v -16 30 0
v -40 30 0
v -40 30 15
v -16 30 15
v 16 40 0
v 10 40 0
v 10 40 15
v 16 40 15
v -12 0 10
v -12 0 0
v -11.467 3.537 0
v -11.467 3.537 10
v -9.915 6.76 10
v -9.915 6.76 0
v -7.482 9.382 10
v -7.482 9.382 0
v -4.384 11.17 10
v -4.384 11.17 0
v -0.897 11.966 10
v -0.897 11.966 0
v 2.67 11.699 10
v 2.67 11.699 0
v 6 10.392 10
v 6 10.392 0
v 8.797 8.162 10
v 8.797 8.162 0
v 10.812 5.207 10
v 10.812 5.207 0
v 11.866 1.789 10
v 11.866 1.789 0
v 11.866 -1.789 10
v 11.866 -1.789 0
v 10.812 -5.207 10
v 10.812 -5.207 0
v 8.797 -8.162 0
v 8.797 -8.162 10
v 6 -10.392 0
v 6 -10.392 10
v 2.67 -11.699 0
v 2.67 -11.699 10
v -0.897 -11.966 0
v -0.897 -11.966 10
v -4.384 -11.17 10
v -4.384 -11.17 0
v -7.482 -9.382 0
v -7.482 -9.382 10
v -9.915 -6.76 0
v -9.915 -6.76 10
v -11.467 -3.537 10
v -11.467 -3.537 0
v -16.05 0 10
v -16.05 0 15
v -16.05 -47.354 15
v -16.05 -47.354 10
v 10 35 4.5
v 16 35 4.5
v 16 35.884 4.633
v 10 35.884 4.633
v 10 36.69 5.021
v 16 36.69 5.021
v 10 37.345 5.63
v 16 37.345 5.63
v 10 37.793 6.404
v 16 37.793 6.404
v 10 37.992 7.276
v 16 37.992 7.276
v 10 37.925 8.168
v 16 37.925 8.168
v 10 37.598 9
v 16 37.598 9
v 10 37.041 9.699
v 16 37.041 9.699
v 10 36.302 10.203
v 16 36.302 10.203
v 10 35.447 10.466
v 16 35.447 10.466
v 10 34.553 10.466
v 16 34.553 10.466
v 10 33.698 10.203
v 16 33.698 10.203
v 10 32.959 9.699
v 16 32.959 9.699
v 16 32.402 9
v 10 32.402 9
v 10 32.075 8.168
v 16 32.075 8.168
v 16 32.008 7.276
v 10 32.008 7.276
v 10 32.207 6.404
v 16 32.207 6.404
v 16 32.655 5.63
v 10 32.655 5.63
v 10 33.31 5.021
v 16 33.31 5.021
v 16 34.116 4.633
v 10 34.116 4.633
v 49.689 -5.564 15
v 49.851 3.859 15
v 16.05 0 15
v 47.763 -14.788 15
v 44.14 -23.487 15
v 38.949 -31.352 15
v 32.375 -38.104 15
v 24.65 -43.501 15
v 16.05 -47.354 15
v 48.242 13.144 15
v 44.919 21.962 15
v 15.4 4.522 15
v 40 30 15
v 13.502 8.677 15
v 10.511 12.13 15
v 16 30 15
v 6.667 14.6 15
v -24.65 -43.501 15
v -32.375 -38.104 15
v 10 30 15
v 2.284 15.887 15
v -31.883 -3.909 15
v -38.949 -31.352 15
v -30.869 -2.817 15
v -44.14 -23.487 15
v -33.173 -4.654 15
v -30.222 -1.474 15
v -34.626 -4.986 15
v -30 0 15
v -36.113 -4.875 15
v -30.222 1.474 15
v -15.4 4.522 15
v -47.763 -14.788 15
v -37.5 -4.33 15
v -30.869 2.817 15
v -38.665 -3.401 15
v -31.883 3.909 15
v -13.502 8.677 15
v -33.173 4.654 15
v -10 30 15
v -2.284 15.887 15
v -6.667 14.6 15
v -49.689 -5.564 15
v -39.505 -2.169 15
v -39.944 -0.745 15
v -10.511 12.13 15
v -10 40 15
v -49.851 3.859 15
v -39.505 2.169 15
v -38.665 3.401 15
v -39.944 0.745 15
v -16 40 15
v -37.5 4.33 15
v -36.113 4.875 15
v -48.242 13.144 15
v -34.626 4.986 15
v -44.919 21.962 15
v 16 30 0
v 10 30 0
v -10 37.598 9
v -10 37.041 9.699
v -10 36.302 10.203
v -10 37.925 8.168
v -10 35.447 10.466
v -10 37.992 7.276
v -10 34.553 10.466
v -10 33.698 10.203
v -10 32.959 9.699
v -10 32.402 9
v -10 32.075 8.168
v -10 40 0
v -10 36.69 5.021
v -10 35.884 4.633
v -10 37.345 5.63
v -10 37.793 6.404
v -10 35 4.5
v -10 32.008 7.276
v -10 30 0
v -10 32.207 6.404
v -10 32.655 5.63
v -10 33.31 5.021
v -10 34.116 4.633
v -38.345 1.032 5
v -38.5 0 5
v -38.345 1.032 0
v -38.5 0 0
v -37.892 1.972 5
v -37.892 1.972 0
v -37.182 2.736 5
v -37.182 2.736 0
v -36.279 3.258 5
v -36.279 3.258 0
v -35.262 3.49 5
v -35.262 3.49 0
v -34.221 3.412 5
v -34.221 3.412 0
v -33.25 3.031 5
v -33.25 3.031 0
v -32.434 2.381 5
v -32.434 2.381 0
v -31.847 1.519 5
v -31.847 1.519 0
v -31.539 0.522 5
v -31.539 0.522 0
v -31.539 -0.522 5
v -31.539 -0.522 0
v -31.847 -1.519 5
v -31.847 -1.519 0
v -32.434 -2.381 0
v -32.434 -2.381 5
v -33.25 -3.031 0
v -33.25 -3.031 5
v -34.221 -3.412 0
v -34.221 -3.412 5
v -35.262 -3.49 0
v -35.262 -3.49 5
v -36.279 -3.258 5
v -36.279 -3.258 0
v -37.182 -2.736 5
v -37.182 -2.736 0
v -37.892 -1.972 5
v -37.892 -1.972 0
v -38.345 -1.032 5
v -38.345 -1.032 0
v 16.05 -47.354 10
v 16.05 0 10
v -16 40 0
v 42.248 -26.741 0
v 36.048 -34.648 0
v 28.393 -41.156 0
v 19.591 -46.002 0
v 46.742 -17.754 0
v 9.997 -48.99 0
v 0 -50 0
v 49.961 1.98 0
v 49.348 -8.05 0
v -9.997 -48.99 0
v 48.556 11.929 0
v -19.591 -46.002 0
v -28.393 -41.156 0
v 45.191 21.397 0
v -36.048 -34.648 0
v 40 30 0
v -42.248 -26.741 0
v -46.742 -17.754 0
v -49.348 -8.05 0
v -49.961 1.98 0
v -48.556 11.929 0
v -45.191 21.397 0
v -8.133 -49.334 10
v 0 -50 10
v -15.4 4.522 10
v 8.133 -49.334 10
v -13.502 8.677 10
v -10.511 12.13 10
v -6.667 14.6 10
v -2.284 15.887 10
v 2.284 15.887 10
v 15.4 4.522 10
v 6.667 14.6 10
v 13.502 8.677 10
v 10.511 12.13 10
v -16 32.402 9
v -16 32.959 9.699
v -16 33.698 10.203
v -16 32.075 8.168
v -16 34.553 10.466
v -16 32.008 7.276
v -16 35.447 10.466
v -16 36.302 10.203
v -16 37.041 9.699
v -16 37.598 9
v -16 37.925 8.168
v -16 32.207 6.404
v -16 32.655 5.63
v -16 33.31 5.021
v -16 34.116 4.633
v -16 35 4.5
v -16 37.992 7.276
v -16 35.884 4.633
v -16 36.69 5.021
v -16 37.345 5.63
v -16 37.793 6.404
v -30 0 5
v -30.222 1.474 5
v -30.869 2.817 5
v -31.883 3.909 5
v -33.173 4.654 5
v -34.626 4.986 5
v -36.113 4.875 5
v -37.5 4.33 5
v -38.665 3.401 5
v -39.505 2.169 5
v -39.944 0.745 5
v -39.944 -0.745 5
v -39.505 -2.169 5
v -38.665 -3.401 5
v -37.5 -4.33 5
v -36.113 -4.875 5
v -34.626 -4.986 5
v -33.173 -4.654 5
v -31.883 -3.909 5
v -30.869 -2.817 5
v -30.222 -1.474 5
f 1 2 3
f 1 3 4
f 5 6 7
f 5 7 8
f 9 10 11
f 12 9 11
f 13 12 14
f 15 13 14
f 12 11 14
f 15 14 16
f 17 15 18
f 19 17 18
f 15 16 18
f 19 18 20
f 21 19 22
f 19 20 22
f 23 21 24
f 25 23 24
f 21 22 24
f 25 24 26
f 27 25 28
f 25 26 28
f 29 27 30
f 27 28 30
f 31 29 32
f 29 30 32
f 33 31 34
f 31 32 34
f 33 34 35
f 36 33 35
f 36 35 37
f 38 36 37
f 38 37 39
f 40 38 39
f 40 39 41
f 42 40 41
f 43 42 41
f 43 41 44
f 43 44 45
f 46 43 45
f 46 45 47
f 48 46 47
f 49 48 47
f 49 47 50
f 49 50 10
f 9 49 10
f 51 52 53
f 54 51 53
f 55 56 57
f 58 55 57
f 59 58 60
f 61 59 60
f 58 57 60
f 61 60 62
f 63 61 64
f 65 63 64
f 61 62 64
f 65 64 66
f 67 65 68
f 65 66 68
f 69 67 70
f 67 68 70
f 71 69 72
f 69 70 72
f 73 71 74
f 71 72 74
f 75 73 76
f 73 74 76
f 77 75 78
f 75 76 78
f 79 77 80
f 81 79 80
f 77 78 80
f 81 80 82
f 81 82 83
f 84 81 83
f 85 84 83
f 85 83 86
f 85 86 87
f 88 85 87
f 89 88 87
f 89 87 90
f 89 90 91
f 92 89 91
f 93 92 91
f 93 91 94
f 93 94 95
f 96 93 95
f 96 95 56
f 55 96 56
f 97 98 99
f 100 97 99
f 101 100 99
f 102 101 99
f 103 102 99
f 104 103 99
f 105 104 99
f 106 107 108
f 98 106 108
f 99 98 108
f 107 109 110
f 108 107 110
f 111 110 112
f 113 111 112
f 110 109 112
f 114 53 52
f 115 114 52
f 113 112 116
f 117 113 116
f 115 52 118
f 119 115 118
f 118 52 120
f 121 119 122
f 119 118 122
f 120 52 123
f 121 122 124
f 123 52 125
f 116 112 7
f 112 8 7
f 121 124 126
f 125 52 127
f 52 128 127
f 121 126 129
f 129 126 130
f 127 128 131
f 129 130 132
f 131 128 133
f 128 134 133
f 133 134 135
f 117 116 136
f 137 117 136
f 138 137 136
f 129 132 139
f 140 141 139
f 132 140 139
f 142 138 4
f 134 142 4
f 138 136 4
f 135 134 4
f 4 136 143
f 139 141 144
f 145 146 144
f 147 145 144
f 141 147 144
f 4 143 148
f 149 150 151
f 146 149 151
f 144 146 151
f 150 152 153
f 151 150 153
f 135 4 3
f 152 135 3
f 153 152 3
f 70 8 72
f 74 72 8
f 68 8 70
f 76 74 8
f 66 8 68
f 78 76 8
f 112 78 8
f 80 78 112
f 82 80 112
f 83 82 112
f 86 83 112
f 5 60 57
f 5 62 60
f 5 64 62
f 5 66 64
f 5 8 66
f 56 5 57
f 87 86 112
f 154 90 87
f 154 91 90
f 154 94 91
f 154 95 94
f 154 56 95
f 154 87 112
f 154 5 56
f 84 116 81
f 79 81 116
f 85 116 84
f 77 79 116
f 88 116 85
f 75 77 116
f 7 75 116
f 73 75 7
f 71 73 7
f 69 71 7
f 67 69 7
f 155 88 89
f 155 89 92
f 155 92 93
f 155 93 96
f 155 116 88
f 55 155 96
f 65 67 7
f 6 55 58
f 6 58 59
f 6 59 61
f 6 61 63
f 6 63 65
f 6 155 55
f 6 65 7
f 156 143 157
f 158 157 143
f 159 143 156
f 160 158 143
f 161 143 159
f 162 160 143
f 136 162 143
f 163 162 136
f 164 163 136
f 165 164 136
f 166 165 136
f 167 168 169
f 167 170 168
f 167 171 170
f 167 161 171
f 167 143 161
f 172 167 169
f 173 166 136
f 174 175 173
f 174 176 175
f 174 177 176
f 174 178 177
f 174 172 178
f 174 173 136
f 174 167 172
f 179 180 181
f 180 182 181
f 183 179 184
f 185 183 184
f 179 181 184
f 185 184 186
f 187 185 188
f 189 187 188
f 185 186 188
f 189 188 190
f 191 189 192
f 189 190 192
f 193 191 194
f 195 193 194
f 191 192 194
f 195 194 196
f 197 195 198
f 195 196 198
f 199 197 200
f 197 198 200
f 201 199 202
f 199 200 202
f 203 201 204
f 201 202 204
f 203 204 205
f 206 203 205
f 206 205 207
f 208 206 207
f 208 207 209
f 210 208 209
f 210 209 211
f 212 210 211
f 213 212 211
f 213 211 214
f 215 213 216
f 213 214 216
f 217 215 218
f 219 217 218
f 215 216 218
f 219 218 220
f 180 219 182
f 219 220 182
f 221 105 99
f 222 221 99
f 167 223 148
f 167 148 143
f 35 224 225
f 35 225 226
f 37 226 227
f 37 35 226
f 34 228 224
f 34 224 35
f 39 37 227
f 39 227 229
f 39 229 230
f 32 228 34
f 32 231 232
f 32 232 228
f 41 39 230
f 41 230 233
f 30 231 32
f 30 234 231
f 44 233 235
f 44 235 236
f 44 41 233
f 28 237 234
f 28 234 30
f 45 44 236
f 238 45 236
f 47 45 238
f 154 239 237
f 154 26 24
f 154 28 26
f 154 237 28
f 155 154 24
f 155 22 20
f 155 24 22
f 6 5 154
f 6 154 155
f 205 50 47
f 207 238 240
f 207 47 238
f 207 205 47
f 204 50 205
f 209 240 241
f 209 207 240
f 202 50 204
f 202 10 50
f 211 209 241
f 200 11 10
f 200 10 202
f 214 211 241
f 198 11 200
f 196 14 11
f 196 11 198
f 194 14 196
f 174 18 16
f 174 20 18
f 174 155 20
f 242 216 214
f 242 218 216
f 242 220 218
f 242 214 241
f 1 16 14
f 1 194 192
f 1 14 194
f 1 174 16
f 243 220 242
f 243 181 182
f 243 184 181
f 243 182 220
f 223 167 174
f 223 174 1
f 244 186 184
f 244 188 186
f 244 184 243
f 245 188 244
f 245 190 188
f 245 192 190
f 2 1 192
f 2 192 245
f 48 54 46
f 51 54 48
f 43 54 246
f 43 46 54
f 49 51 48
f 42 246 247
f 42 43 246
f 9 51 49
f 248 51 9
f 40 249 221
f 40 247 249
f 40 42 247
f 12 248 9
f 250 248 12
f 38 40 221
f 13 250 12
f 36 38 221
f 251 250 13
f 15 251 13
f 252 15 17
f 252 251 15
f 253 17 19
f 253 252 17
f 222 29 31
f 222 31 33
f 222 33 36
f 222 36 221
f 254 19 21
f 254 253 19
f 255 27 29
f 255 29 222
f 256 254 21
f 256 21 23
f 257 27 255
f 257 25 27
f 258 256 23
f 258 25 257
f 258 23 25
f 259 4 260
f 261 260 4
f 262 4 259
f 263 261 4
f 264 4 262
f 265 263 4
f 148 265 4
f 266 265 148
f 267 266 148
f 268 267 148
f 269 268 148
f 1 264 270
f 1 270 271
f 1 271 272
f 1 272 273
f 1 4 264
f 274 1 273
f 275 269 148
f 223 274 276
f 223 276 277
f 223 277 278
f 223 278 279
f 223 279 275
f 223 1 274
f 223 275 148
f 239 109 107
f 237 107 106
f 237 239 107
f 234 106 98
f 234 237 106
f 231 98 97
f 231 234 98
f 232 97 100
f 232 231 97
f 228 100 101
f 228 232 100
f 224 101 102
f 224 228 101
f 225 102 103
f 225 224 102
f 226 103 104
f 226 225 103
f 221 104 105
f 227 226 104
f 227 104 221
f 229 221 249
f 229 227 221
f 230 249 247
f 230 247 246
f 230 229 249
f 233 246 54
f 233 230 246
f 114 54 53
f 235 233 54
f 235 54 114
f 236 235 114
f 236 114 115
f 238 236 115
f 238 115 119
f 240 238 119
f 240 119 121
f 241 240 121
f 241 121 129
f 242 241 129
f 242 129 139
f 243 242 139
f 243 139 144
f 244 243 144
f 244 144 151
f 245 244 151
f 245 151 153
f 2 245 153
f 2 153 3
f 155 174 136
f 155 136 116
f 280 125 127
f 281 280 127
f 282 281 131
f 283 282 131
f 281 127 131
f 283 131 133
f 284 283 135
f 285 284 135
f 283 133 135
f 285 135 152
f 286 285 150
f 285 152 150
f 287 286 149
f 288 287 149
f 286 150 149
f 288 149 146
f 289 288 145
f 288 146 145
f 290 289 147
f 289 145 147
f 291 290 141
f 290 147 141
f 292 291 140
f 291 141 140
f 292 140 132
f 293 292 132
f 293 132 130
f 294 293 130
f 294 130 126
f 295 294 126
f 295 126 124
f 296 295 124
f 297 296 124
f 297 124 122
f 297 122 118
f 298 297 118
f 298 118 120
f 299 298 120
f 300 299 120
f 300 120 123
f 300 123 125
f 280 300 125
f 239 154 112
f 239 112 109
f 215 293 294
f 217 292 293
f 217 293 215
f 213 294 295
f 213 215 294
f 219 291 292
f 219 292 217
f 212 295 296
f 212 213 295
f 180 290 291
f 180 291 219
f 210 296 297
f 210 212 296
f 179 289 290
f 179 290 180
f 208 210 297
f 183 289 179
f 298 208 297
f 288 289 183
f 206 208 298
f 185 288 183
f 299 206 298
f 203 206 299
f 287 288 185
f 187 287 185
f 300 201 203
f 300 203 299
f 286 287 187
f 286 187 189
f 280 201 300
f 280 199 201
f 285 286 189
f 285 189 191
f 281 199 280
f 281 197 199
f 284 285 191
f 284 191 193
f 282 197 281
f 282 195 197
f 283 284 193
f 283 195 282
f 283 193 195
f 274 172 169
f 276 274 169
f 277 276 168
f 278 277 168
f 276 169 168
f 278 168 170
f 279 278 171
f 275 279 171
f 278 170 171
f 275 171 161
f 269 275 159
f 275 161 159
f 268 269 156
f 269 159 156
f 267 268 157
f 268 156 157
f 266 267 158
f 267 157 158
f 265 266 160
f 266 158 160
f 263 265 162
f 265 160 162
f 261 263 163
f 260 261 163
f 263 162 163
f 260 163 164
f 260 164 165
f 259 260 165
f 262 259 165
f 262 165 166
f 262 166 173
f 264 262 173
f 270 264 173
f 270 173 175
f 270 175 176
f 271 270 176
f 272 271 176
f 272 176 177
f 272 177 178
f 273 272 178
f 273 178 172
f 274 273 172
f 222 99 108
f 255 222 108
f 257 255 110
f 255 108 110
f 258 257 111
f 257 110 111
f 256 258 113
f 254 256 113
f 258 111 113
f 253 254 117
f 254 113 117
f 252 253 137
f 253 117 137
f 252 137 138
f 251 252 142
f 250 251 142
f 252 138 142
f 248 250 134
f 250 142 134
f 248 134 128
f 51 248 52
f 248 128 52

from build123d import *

# Parameters (mm, degrees)
ESTRUSIONE_ESTRUSIONE1_DEPTH                         = 15
TAGLIO_ESTRUSIONE1_DEPTH                             = 5
FORO_6_0_6_1_D                                       = 6
FORO_LAMATO_PER_BULLONE_M5_A_TESTA_ESAGO_D           = 7
FORO_LAMATO_PER_BULLONE_M5_A_TESTA_ESAGO_CBORE_D     = 10
FORO_LAMATO_PER_BULLONE_M5_A_TESTA_ESAGO_CBORE_DEPTH = 10
FORO_24_0_24_1_D                                     = 24


with BuildPart() as part:
    # Schizzo1 → Estrusione-Estrusione1 (new body)
    with BuildSketch(Plane.XY):
        with BuildLine():
            Line((-40, 30), (-16, 30))
            Line((-16, 30), (-16, 40))
            Line((-16, 40), (-10, 40))
            Line((-10, 40), (-10, 30))
            Line((-10, 30), (10, 30))
            Line((10, 30), (10, 40))
            Line((10, 40), (16, 40))
            Line((16, 40), (16, 30))
            Line((16, 30), (40, 30))
            ThreePointArc((40, 30), (0, -50), (-40, 30))
        make_face()
    extrude(amount=ESTRUSIONE_ESTRUSIONE1_DEPTH)

    # Schizzo2 → Taglio-Estrusione1 (cut)
    with BuildSketch(Plane.XY.offset(15)):
        with BuildLine():
            Line((-16.05, 0), (-16.05, -50))
            Line((-16.05, -50), (16.05, -50))
            Line((16.05, -50), (16.05, 0))
            ThreePointArc((16.05, 0), (0, 16.05), (-16.05, 0))
        make_face()
    extrude(amount=-TAGLIO_ESTRUSIONE1_DEPTH, mode=Mode.SUBTRACT)

    # Foro Ø6.0 (6)-1 (through all)
    with Locations(Plane.ZY.offset(16)):
        with Locations((7.5, 35)):
            Hole(FORO_6_0_6_1_D / 2)

    # Foro lamato per Bullone M5 a testa esagonale-1 (through all)
    with Locations(Plane.XY.offset(15)):
        with Locations((-35, 0)):
            CounterBoreHole(FORO_LAMATO_PER_BULLONE_M5_A_TESTA_ESAGO_D / 2, FORO_LAMATO_PER_BULLONE_M5_A_TESTA_ESAGO_CBORE_D / 2, FORO_LAMATO_PER_BULLONE_M5_A_TESTA_ESAGO_CBORE_DEPTH)

    # Foro Ø24.0 (24)-1 (through all)
    with Locations(Plane.XY.offset(10)):
        with Locations((0, 0)):
            Hole(FORO_24_0_24_1_D / 2)


solid = part.part
